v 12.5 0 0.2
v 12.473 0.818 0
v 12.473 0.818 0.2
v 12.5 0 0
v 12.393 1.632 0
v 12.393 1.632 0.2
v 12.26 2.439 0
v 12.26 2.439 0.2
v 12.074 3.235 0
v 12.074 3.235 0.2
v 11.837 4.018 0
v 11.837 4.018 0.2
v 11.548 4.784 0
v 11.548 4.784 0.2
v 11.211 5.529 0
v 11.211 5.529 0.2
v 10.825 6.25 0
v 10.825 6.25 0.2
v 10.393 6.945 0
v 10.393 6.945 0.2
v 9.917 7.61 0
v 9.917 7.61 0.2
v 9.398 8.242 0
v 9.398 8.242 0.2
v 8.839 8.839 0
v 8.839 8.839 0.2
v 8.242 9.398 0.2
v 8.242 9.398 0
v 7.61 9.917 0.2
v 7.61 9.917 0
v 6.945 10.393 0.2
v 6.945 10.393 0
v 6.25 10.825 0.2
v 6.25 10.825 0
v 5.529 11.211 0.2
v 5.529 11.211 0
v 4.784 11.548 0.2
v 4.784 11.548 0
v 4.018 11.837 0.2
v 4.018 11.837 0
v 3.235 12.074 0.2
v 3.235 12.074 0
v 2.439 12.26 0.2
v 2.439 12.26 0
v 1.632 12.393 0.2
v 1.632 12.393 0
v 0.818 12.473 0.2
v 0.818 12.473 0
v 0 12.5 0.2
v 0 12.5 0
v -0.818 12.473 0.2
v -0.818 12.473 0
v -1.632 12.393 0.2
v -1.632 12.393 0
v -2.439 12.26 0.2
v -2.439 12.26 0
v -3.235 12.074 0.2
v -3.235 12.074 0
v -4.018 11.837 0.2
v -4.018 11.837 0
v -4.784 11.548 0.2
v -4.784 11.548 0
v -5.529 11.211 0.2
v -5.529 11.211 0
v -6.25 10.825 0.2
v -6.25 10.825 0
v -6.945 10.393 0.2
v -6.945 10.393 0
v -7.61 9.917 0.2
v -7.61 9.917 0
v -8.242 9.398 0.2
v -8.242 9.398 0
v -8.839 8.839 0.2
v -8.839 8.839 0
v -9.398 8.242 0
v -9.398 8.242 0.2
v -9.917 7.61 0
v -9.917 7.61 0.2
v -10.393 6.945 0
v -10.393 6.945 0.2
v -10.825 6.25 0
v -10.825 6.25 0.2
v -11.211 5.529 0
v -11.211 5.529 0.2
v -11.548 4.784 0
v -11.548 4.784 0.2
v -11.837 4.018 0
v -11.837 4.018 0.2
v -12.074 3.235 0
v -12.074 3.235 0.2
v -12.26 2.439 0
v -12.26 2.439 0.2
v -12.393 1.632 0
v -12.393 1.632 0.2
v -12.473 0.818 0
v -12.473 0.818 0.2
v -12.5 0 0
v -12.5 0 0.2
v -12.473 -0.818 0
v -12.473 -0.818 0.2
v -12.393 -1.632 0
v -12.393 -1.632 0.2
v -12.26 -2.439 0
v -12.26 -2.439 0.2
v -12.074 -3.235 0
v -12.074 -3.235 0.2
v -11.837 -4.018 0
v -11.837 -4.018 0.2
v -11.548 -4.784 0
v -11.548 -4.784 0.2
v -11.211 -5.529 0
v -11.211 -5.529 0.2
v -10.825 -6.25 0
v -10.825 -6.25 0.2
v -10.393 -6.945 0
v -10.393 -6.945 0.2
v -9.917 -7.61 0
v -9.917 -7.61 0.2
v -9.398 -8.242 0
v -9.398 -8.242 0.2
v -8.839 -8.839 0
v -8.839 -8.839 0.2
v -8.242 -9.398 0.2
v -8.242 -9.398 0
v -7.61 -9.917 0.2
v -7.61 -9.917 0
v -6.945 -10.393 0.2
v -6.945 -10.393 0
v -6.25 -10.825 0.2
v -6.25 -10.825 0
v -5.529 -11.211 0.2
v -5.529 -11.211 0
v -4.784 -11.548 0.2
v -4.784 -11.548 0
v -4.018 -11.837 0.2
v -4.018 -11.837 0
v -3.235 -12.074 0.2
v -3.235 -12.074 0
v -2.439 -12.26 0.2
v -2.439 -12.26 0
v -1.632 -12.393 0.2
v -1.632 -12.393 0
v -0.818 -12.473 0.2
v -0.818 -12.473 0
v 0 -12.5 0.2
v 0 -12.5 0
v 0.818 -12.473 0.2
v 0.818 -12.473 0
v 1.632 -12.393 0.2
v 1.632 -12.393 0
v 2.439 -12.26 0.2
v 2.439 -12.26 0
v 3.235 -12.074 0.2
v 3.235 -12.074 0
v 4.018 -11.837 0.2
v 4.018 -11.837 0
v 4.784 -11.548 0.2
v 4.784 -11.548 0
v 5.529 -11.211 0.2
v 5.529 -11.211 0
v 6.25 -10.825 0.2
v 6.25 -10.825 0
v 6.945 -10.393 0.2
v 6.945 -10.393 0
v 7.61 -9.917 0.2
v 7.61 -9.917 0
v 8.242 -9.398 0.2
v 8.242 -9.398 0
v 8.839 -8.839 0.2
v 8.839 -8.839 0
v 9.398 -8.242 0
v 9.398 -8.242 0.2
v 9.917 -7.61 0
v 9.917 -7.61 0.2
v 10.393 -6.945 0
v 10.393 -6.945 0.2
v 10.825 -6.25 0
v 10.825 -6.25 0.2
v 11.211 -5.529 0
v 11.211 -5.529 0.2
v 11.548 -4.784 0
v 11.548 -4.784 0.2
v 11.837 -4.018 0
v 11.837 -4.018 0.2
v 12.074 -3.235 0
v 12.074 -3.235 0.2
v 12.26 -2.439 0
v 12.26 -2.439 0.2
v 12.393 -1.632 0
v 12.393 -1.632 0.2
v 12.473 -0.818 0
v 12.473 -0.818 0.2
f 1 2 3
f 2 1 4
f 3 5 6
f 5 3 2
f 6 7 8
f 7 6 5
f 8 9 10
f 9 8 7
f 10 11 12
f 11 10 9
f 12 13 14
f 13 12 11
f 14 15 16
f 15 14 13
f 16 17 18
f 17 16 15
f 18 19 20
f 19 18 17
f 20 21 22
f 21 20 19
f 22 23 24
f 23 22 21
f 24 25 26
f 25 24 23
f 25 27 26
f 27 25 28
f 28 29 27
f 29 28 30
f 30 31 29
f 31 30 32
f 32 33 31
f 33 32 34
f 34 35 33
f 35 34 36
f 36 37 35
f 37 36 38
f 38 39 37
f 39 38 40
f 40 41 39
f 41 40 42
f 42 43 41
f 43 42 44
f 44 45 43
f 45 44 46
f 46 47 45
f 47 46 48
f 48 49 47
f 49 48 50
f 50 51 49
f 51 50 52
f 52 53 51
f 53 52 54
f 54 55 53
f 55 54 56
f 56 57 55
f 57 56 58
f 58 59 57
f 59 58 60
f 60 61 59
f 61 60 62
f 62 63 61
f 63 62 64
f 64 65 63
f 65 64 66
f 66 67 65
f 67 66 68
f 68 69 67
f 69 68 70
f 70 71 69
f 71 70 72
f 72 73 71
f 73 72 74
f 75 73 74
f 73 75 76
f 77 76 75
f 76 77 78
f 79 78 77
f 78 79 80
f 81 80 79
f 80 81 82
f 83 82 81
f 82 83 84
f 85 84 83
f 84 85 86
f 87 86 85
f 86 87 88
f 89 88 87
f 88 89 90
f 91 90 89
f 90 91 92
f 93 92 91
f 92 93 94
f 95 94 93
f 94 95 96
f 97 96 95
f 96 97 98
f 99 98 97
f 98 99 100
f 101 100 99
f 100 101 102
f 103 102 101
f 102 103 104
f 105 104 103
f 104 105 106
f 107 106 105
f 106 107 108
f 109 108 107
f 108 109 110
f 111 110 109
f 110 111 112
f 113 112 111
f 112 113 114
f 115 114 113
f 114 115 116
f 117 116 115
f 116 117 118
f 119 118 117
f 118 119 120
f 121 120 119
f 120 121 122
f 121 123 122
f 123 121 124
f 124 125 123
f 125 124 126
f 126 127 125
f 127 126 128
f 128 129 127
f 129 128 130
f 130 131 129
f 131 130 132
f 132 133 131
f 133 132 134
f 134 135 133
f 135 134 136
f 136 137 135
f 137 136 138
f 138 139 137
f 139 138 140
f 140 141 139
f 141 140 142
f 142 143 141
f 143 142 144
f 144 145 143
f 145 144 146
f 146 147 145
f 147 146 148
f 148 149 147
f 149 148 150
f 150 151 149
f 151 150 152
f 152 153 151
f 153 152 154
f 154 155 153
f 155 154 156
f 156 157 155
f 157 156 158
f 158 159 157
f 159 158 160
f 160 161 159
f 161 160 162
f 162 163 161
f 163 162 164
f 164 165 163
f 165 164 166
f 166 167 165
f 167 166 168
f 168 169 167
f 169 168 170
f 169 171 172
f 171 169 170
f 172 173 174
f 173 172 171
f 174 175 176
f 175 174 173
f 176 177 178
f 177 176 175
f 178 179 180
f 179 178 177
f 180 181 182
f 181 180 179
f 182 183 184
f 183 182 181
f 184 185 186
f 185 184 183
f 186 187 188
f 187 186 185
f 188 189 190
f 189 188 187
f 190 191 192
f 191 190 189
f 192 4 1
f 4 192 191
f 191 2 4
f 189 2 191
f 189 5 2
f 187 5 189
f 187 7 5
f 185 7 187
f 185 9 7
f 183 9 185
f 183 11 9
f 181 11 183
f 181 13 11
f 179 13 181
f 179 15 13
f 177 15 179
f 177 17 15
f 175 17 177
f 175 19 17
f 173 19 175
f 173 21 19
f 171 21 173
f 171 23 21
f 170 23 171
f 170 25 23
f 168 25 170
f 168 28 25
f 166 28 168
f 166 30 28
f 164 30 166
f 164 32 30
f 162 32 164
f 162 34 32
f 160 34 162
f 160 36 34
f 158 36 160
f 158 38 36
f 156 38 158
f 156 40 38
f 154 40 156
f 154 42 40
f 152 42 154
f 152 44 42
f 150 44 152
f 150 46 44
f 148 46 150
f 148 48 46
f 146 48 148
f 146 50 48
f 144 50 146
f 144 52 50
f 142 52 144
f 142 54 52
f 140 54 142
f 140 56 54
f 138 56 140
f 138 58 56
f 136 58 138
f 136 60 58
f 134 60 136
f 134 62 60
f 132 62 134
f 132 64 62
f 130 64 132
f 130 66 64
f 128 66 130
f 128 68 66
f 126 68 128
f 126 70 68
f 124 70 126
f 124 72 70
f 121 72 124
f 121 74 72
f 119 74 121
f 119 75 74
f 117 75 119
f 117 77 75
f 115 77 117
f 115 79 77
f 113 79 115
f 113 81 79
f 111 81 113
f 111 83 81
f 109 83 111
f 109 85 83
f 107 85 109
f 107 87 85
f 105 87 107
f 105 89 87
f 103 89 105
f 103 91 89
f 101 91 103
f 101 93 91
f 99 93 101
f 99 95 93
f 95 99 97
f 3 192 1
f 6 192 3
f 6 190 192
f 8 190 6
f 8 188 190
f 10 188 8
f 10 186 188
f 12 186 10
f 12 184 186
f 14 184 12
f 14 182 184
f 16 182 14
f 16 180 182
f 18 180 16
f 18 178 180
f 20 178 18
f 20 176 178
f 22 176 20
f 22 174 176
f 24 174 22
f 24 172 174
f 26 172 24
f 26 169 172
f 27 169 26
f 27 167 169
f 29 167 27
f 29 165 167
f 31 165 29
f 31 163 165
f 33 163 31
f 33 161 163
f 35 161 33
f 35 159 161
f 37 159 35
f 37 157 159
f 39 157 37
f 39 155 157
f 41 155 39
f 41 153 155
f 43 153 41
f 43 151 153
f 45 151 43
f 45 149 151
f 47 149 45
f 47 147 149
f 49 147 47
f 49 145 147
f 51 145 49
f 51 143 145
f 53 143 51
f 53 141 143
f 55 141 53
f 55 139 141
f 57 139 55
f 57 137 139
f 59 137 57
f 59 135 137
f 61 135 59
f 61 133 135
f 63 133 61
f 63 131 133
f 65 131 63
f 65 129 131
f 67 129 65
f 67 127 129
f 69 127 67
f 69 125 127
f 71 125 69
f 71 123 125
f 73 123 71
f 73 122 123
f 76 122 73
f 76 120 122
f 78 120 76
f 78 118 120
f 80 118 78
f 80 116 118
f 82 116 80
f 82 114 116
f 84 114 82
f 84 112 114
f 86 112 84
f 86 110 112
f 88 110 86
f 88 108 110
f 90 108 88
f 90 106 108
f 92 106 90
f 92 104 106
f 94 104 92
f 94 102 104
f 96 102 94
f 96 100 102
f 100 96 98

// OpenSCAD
// An NFC tag of the parts library (packages/contracts/src/parts/nfc-tags.ts), at the sizes given as -D overrides: a flat disc of
// diameter D and thickness H. `npm run check:assembly` renders it to check the tags a model holds (e.g. the cat collar tag's).
// Frame: millimetres, as the parts library's preview: lying on z = 0, centred on the Z axis.

D = 25;
H = 0.2;

$fn = 96;
cylinder(d = D, h = H);
